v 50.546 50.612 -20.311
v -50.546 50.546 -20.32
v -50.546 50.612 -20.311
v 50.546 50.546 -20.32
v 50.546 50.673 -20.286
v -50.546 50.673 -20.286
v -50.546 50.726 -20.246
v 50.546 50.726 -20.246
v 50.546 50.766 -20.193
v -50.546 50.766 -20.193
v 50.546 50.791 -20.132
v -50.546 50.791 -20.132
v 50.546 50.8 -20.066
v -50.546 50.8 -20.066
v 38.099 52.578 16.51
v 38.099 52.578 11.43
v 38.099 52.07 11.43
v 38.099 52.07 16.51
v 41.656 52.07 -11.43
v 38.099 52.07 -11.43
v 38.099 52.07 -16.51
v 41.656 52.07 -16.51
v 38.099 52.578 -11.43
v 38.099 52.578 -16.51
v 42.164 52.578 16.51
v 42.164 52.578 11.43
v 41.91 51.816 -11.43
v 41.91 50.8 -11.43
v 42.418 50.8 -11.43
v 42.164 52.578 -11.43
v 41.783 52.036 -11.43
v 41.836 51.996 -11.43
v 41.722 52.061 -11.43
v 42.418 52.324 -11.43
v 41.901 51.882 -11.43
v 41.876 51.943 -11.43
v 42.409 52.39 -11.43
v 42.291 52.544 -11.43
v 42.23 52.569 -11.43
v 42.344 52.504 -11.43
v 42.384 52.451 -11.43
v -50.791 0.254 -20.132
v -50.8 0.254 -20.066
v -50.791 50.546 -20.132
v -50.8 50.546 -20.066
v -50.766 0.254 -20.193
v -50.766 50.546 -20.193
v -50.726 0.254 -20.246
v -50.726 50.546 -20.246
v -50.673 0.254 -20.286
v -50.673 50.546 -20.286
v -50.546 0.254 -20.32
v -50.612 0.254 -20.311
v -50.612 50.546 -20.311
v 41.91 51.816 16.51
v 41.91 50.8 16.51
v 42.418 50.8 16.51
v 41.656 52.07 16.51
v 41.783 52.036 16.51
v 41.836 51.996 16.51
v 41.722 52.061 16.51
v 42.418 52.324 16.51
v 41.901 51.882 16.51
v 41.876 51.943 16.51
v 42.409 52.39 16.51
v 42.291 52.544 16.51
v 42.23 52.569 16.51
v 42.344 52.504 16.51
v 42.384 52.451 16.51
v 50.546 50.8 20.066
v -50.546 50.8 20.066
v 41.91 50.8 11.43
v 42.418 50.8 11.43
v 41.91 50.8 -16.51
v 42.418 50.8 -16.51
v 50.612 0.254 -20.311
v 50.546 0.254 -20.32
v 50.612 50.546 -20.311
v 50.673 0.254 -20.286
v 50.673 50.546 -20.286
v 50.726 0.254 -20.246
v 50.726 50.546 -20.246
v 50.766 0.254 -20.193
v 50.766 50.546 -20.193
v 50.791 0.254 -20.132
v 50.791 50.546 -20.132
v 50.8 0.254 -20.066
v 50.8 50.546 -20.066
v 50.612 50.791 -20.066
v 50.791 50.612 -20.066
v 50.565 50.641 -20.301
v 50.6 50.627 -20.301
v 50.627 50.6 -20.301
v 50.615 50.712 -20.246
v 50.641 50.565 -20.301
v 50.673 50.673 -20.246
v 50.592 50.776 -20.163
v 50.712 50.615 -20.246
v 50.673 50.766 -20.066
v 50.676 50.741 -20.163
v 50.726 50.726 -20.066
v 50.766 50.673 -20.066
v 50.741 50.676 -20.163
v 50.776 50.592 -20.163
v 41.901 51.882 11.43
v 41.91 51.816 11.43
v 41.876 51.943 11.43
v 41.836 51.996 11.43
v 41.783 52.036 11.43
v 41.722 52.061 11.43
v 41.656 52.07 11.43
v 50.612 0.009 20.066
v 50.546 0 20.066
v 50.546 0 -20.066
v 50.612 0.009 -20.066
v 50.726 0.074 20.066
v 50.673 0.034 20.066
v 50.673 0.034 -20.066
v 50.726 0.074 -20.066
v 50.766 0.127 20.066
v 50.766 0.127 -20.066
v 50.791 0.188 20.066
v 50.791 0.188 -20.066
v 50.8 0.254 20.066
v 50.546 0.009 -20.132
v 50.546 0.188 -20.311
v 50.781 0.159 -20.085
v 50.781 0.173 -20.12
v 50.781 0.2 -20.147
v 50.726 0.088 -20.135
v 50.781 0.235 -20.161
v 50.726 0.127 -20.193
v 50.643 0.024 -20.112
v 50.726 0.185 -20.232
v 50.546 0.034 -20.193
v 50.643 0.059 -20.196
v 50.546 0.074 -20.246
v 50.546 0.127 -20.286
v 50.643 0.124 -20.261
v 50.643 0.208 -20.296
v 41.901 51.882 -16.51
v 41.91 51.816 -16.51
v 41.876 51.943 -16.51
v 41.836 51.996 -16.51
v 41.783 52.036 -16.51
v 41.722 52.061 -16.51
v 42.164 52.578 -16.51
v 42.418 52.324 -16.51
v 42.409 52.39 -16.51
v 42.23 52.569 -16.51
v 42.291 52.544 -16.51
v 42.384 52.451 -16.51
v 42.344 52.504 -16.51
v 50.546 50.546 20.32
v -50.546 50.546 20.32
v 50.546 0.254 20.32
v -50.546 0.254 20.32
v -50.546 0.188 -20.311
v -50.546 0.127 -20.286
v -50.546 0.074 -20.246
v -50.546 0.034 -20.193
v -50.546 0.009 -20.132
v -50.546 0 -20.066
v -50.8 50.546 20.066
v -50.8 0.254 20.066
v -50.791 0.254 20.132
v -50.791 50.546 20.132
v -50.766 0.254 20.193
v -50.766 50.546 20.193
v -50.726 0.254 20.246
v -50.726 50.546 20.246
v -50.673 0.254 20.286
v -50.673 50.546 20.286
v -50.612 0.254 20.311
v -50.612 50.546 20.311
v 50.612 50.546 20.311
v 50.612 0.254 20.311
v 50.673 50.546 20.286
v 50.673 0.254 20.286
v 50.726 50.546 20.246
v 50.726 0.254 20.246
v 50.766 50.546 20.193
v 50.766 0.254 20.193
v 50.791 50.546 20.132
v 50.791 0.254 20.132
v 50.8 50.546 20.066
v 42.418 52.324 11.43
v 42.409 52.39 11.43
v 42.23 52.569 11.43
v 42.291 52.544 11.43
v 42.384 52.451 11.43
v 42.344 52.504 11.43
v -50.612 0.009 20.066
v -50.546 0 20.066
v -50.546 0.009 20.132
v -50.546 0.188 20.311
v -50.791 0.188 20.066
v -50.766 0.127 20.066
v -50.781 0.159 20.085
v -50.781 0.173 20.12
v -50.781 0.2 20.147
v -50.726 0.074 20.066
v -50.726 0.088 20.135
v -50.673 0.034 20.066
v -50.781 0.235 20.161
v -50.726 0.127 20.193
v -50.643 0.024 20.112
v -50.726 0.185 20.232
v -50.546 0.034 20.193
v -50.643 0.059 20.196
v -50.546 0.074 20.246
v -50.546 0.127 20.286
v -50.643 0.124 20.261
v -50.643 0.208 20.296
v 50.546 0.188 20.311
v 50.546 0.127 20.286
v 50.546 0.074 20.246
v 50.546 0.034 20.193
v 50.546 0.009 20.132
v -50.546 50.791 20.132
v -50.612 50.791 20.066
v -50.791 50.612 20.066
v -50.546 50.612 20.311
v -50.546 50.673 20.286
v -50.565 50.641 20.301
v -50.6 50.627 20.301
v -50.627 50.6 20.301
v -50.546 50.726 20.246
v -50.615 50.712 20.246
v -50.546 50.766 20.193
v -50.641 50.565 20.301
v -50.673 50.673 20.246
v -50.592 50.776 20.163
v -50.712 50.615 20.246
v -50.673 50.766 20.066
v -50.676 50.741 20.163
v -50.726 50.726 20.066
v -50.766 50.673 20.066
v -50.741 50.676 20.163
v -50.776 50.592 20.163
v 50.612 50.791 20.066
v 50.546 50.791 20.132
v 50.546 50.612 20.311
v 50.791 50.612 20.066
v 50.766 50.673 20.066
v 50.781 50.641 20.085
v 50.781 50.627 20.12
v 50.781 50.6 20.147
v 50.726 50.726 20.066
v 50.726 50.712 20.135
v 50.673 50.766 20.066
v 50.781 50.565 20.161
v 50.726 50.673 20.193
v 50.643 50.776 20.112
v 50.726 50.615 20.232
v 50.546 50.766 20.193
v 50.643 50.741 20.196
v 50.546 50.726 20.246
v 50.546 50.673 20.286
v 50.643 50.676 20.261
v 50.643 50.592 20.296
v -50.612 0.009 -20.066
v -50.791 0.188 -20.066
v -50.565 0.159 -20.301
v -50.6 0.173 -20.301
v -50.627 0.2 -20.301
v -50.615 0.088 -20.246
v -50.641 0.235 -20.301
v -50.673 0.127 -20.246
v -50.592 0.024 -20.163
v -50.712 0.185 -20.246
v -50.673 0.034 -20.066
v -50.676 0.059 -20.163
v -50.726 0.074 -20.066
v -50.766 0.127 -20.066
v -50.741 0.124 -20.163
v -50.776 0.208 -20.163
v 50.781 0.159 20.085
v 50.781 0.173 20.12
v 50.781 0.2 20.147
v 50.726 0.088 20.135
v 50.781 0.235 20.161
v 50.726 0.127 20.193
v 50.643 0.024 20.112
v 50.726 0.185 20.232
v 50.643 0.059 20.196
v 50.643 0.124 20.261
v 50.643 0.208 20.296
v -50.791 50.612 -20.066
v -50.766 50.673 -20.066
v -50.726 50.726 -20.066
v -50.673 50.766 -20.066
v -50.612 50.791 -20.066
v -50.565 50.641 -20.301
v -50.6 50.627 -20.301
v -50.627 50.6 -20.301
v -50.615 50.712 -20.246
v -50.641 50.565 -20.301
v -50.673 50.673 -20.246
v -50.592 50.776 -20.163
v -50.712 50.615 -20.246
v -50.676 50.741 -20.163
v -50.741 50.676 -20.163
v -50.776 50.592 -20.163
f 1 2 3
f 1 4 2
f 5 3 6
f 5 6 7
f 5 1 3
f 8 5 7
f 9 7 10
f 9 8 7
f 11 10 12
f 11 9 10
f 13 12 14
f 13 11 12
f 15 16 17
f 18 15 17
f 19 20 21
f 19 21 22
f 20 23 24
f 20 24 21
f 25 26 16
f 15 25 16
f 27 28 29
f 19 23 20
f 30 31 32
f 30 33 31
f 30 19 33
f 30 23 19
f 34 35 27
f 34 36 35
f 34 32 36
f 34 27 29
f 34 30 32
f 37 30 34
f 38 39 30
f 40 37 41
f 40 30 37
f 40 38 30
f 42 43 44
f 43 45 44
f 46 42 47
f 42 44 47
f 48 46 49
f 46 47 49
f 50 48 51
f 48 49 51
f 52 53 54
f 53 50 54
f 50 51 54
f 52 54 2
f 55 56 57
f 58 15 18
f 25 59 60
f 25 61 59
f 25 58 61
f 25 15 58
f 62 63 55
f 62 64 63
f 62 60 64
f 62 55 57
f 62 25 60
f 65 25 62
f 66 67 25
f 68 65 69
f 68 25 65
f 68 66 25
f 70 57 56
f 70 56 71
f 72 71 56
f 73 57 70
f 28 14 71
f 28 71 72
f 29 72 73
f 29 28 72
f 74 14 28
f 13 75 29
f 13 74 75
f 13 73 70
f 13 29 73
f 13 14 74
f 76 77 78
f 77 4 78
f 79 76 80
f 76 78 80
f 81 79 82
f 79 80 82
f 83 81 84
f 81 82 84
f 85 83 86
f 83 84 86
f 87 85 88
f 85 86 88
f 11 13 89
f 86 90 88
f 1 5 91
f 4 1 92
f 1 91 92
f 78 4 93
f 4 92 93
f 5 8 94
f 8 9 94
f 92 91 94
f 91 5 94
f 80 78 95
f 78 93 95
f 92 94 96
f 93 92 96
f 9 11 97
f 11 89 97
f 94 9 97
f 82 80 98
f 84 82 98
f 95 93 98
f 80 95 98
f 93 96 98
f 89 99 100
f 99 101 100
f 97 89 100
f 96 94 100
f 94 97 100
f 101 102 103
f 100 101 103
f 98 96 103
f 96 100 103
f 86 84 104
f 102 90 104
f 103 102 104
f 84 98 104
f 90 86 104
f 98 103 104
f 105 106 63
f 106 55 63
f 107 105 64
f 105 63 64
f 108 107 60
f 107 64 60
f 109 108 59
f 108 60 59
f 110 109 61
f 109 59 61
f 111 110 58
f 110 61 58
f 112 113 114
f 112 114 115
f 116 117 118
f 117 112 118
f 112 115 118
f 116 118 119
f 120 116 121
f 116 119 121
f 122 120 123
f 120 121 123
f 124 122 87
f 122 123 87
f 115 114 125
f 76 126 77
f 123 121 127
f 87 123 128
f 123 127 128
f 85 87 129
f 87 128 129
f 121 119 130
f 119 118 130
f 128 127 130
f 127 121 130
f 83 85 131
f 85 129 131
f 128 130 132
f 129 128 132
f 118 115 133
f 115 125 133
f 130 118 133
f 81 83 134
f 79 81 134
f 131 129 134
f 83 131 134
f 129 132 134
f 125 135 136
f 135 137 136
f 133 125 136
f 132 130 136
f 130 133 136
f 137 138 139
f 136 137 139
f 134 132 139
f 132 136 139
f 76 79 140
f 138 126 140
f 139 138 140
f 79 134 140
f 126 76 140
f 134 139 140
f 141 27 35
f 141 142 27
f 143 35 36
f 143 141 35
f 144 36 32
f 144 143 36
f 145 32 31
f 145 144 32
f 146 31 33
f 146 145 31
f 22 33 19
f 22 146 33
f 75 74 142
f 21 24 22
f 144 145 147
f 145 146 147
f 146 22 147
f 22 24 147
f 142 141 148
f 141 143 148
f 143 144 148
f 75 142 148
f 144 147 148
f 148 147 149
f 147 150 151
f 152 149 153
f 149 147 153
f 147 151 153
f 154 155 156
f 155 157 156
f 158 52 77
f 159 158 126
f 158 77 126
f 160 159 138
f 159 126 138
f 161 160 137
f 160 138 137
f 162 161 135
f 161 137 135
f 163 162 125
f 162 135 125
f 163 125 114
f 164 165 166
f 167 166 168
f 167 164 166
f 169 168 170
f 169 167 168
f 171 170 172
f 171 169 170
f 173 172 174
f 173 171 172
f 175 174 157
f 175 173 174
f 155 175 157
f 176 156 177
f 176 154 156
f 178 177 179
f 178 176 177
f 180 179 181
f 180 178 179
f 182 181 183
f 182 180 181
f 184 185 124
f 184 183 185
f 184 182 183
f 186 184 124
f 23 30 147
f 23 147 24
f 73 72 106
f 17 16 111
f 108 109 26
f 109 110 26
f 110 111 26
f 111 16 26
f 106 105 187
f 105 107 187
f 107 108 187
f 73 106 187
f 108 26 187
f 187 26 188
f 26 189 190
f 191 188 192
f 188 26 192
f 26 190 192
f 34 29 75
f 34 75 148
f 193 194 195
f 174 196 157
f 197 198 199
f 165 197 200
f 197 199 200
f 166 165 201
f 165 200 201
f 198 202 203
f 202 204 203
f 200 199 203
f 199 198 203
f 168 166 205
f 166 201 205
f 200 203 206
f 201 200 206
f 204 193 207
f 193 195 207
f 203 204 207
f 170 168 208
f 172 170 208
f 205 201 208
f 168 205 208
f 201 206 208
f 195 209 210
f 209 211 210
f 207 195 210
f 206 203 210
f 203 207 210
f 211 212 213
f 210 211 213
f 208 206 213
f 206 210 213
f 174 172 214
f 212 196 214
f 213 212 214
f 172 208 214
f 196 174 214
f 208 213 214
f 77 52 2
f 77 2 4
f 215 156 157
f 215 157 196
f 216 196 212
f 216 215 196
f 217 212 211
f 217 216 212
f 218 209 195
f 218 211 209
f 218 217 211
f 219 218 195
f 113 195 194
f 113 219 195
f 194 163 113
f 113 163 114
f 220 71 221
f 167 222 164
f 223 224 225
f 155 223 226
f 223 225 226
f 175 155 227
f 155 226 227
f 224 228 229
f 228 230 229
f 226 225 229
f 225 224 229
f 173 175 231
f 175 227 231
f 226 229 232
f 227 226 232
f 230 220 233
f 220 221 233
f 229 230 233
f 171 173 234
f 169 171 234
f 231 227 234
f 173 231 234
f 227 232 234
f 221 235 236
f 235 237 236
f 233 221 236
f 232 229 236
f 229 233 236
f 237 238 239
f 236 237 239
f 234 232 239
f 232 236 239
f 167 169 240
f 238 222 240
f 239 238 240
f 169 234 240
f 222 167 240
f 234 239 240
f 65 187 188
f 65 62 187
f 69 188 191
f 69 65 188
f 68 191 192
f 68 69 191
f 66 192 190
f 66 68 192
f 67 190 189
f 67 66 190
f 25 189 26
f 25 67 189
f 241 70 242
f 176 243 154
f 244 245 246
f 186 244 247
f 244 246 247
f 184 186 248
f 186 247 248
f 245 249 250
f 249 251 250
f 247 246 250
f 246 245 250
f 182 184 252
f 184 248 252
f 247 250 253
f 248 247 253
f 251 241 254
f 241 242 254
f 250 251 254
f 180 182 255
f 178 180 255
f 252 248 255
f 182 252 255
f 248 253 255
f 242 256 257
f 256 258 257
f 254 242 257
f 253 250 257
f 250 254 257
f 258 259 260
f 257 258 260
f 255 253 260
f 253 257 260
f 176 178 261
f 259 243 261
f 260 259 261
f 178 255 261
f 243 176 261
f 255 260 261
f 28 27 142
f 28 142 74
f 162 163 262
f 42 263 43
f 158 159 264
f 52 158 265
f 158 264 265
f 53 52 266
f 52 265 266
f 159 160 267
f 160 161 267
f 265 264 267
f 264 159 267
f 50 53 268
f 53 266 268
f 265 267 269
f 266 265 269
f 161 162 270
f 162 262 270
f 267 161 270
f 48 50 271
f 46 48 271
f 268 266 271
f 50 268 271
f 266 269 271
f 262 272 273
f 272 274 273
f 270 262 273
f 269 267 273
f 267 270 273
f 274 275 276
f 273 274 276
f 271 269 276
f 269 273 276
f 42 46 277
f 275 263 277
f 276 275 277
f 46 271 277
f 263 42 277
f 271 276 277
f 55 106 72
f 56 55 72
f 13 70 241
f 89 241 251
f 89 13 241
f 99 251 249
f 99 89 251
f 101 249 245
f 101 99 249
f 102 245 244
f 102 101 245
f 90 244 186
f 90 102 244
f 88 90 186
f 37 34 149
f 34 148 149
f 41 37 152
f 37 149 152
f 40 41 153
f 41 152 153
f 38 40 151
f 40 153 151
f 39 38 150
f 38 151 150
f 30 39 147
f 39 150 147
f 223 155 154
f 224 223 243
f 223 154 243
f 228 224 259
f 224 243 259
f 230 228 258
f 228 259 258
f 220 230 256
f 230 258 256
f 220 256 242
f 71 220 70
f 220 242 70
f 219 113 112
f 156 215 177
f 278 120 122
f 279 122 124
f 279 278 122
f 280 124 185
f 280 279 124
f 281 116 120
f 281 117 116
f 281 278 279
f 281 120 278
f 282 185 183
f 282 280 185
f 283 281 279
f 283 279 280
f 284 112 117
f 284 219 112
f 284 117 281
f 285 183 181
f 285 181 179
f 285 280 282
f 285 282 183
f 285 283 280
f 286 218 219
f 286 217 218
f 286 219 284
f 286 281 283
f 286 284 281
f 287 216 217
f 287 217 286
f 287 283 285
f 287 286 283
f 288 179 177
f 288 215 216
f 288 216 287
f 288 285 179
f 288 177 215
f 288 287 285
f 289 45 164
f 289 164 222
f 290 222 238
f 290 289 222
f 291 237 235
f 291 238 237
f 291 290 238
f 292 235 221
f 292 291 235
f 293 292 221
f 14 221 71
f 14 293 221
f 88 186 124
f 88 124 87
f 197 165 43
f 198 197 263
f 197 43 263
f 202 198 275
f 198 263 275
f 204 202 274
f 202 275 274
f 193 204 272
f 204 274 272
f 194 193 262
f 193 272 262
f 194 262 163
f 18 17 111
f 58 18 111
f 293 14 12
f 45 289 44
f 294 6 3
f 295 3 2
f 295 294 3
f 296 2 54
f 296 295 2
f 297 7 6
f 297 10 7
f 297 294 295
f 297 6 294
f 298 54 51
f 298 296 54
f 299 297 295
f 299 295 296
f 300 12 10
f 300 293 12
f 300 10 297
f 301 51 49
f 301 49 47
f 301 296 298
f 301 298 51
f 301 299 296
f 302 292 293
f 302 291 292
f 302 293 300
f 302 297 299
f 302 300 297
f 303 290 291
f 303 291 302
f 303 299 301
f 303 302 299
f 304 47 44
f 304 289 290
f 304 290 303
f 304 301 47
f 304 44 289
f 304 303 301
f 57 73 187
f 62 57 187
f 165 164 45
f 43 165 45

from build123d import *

# Parameters (mm, degrees)
SKETCH1_W           = 101.6
SKETCH1_H           = 40.64
BOSS_EXTRUDE1_DEPTH = 50.8
BOSS_EXTRUDE2_START = -8.89
BOSS_EXTRUDE2_DEPTH = 5.08
FILLET1_R           = 0.254


with BuildPart() as part:
    # Sketch1 → Boss-Extrude1 (new body)
    with BuildSketch(Plane(origin=(0, 0, 0), x_dir=(1, 0, 0), z_dir=(0, 1, 0))):
        Rectangle(SKETCH1_W, SKETCH1_H)
    extrude(amount=BOSS_EXTRUDE1_DEPTH)

    # Sketch3 → Boss-Extrude2 (add)
    with BuildSketch(Plane(origin=(0, 0, -20.32), x_dir=(-1, 0, 0), z_dir=(0, 0, -1)).offset(BOSS_EXTRUDE2_START)):
        Polygon((-42.418, 50.8), (-42.418, 52.578), (-38.09867671, 52.578), (-38.09867671, 52.07), (-41.91, 52.07), (-41.91, 50.8), align=None)
    boss_extrude2 = extrude(amount=BOSS_EXTRUDE2_DEPTH)

    # Mirror1: Boss-Extrude2 across plane
    add(boss_extrude2.mirror(Plane.XY))

    # Fillet1
    fillet1_edges = [part.edges().sort_by_distance(p)[0] for p in [
        (-50.8, 50.8, 0),
        (0, 50.8, 20.32),
        (41.91, 52.07, -13.97),
        (42.418, 52.578, -13.97),
        (50.8, 50.8, 0),
        (0, 0, 20.32),
        (-50.8, 0, 0),
        (42.418, 52.578, 13.97),
        (41.91, 52.07, 13.97),
        (0, 0, -20.32),
        (50.8, 0, 0),
        (0, 50.8, -20.32),
        (50.8, 25.4, 20.32),
        (-50.8, 25.4, 20.32),
        (-50.8, 25.4, -20.32),
        (50.8, 25.4, -20.32),
    ]]
    fillet(fillet1_edges, radius=FILLET1_R)


solid = part.part
